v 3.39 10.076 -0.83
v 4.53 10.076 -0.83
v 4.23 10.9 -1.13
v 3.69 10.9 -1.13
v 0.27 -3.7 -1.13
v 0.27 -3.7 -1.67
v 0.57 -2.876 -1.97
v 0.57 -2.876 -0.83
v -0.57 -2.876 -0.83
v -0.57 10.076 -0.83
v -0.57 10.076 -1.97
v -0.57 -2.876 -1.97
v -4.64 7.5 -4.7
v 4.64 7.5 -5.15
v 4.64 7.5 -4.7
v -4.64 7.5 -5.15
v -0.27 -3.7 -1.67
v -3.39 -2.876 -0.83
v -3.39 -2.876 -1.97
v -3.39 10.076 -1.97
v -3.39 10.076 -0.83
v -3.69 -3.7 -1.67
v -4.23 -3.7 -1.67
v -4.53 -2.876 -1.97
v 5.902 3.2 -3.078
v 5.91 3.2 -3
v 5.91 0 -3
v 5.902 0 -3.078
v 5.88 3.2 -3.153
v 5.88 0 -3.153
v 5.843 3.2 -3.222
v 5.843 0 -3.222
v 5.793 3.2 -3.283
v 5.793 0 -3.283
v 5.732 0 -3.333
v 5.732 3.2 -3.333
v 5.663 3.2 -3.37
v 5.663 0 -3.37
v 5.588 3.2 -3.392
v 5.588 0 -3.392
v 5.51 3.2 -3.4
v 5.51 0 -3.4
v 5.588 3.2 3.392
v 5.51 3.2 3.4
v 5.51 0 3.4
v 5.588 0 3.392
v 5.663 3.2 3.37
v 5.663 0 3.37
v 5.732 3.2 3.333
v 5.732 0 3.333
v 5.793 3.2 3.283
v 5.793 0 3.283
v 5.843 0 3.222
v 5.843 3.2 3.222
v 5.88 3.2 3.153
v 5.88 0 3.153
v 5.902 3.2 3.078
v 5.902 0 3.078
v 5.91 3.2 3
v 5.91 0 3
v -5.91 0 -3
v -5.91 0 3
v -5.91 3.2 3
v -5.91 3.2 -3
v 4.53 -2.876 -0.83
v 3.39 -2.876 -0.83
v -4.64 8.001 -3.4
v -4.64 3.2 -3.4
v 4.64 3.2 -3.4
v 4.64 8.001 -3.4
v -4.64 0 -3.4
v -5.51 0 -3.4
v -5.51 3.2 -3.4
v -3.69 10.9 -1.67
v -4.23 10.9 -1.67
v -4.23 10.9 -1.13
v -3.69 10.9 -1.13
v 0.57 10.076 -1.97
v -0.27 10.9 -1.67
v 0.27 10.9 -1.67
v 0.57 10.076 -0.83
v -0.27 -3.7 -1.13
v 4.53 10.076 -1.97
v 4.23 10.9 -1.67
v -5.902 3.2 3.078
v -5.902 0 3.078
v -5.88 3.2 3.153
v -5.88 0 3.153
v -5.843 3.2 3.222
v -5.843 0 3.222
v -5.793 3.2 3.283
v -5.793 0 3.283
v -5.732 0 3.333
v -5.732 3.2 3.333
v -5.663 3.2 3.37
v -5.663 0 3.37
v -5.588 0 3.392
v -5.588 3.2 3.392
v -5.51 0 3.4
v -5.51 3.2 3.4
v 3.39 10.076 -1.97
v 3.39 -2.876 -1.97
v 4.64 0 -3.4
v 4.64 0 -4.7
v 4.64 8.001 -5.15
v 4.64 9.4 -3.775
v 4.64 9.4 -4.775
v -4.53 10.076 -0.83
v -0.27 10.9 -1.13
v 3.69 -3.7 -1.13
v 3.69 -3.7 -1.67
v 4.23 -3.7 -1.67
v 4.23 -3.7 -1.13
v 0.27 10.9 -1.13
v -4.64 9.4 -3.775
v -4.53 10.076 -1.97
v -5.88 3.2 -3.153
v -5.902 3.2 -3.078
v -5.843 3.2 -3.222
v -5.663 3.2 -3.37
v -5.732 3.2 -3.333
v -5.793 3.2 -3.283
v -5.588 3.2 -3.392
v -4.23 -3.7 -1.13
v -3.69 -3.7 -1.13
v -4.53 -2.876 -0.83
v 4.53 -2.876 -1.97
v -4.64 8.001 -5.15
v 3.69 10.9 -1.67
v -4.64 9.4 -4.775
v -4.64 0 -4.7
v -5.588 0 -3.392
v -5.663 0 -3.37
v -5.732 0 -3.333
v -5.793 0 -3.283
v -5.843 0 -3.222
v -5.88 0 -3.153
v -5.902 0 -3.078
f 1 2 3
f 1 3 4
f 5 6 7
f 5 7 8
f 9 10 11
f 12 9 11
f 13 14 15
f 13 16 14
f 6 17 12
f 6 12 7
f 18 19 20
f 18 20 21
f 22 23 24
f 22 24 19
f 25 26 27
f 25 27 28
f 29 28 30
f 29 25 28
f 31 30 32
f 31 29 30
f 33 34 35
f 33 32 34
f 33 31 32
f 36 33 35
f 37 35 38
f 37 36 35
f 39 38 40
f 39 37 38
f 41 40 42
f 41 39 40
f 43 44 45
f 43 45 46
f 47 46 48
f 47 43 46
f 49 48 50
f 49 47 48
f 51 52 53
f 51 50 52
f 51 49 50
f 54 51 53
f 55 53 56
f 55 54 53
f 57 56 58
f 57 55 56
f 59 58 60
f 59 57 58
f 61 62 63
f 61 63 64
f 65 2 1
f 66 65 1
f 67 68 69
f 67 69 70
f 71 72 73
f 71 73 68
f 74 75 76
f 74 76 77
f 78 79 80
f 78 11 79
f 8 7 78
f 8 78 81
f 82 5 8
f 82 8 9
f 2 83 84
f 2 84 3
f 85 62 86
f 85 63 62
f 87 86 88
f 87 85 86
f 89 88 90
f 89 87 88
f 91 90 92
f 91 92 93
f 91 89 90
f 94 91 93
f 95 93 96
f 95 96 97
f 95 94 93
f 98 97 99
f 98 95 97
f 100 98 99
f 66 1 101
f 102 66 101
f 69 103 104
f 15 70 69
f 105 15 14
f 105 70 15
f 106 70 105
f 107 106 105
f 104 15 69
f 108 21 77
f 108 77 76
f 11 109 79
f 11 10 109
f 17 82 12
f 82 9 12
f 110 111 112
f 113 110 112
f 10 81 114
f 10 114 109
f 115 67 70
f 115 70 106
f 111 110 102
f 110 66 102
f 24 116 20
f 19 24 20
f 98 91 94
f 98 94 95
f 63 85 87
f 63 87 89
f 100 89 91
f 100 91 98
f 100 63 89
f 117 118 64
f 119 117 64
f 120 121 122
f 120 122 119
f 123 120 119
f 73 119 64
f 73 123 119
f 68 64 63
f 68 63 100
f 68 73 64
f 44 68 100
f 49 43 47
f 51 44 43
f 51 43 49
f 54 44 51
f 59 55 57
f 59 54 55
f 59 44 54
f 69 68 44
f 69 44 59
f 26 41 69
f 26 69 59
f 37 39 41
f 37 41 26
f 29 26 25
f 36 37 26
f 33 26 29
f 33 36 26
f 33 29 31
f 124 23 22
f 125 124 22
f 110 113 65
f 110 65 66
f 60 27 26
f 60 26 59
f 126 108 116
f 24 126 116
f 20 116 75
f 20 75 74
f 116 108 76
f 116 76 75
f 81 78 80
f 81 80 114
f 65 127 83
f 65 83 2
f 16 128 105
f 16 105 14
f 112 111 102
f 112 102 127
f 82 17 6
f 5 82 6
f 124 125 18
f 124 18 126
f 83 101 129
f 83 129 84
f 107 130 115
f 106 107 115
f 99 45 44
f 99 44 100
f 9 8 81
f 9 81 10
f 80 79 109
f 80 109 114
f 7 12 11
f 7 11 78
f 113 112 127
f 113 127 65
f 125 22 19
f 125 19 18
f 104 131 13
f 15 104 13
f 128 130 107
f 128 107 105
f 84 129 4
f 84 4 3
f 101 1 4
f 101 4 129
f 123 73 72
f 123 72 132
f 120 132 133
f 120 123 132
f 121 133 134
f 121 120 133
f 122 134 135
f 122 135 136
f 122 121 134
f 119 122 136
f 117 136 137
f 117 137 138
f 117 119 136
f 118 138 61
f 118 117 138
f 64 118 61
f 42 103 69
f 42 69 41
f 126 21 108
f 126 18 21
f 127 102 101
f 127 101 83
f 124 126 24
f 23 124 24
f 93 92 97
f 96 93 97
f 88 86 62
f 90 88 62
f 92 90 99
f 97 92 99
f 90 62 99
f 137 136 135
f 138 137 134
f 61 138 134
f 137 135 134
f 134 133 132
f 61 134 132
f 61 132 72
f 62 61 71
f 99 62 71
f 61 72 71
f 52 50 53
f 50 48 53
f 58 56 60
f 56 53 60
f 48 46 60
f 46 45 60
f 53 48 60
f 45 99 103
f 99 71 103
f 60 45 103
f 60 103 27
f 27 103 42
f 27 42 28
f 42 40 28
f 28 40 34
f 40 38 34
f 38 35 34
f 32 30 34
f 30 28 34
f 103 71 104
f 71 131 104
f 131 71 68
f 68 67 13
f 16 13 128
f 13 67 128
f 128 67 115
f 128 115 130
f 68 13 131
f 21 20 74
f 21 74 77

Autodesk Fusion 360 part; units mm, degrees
sketch "Skizze1" plane through (0, 0, 0) normal (0, 1, 0) x (1, 0, 0)
  line L0 (-5.91, 3.4) -> (5.91, 3.4)
  line L1 (5.91, 3.4) -> (5.91, -3.4)
  line L2 (5.91, -3.4) -> (-5.91, -3.4)
  line L3 (-5.91, -3.4) -> (-5.91, 3.4)
  line L4 (0, 3.4) -> (0, -3.4) construction
  dimension "d9" = 11.82
  dimension "d10" = 6.8
extrude "Extrusion1" add sketch "Skizze1" along normal blind 3.2 makes body 1
sketch "Skizze3" plane through (0, 0, 0) normal (1, 0, 0) x (0, 0, -1)
  line L0 (3.4, 0) -> (3.4, 3.2)
  line L1 (3.4, 0) -> (4.7, 0)
  line L2 (4.7, 0) -> (4.7, 9.4)
  line L3 (4.7, 9.4) -> (3.4, 9.4) construction
  line L4 (3.4, 9.4) -> (3.4, 0)
  line L5 (4.7, 9.4) -> (5.15, 9.4)
  line L6 (5.15, 9.4) -> (5.15, 0)
  line L7 (5.15, 0) -> (4.7, 0)
  line L8 (4.7, 0) -> (4.7, 9.4) construction
  line L9 (3.4, 8.0005) -> (3.775, 9.4)
  line L10 (4.775, 9.4) -> (5.15, 8.0005)
  line L11 (5.15, 7.5005) -> (4.7, 7.5005)
  line L12 (4.775, 9.4) -> (3.775, 9.4)
  line L13 (3.775, 9.4) -> (4.775, 9.4) construction
  line L14 (4.775, 9.4) -> (5.15, 9.4) construction
  line L15 (3.775, 9.4) -> (3.4, 9.4) construction
  line L16 (5.15, 9.4) -> (4.775, 9.4) construction
  line L17 (5.15, 8.0005) -> (5.15, 7.5005) construction
  line L18 (5.15, 7.5005) -> (5.15, 8.0005) construction
  line L19 (5.15, 9.4) -> (3.4, 9.4)
  line L20 (5.15, 0) -> (3.4, 0)
  dimension "d31" = 9.4
  dimension "d33" = 1.3
  dimension "d35" = 90
  dimension "d36" = 75
  dimension "d37" = 75
  dimension "d39" = 1
  dimension "d42" = 0.5
  dimension "d48" = 1.75
sketch "Skizze2" plane through (0, 0, 0) normal (0, 1, 0) x (1, 0, 0)
  line L0 (-3.39, 0.83) -> (-4.53, 0.83)
  line L1 (-4.53, 0.83) -> (-4.53, 1.97)
  line L2 (-4.53, 1.97) -> (-3.39, 1.97)
  line L3 (-3.39, 1.97) -> (-3.39, 0.83)
  line L4 (-5.91, 3.4) -> (5.91, 3.4)
  line L5 (5.91, 3.4) -> (5.91, -3.4)
  line L6 (5.91, -3.4) -> (-5.91, -3.4)
  line L7 (-5.91, -3.4) -> (-5.91, 3.4)
  line L8 (0, 3.4) -> (0, 1.4) construction
  line L9 (-3.39, 1.4) -> (-4.53, 1.4) construction
  line L10 (0, 1.4) -> (-3.96, 1.4)
  point P0 (-3.96, 1.4)
  dimension "d16" = 1.14
  dimension "d17" = 1.14
  dimension "d24" = 2
  dimension "d26" = 3.96
extrude "Extrusion3" add sketch "Skizze3" along normal mid plane 9.28 contours L0 L1 L2 L4 L9 L12 L19 L20 | L2 L5 L6 L10 L11 L12 L19 bodies 1
extrude "Extrusion2" add sketch "Skizze2" along normal blind 10.9 and the other way blind 3.7 separate body contours L0 L1 L2 L3 makes body 2
chamfer "Fase2" distance 0.3 angle 70 8 edges at (-3.96, 10.9, -0.83) (-3.39, 10.9, -1.4) (-3.96, 10.9, -1.97) (-4.53, 10.9, -1.4) (-3.39, -3.7, -1.4) (-3.96, -3.7, -0.83) (-4.53, -3.7, -1.4) (-3.96, -3.7, -1.97) measured on face at (-3.77, 10.9, -1.21) measured on face at (-3.77, 10.9, -1.21) measured on face at (-3.77, 10.9, -1.21) measured on face at (-3.77, 10.9, -1.21) measured on face at (-3.77, -3.7, -1.21) measured on face at (-3.77, -3.7, -1.21) measured on face at (-3.77, -3.7, -1.21) measured on face at (-3.77, -3.7, -1.21) on bodies 2
pattern_linear "R-Anordnung1" count 3 spacing 3.96 along (1, 0, 0) of bodies 2 makes body 3 at (0.57, 1.4414, -1.59) makes body 4 at (4.53, 1.4414, -1.59)
fillet "Abrundung1" radius 0.4 4 edges at (5.91, 1.6, -3.4) (5.91, 1.6, 3.4) (-5.91, 1.6, 3.4) (-5.91, 1.6, -3.4) on bodies 1
equation "n = 3" comment "Number of pins"
equation "P = 3.96 mm" comment "Pin pitch"
equation "B1 = A1 + ( 1.95 mm * 2 )" comment "Width of bottom plate"
equation "A1 = ( n - 1 ) * P" comment "Total width of all pins"
equation "C1 = 6.8 mm" comment "Height of bottom plate"
equation "H1 = 9.4 mm" comment "Height of latching plate"
equation "O1 = 2 mm" comment "Vertical offset pin-center to bottom plate border"
equation "d9 = B1"
equation "d10 = C1"
equation "D1 = 3.2 mm" comment "Total depth of bottom plate"
equation "Pw = 1.14 mm" comment "Width & height of square pin"
equation "d13 = D1"
equation "d16 = Pw"
equation "d17 = Pw"
equation "LPinTop = 7.7 mm + D1" comment "Length of the pin measured from the bottom plane to the top of the pin (away from PCB)"
equation "LPinBottom = 14.6 mm - LPinTop" comment "Length of the pin in bottom direction, measured from the bottom plane"
equation "d20 = LPinTop"
equation "d22 = LPinBottom"
equation "d24 = O1"
equation "Pin1XOffset = ( ( n - 1 ) * P ) / 2" comment "First pin X offset measured from the X axis"
equation "d26 = Pin1XOffset"
equation "d27 = n"
equation "d29 = P"
equation "d31 = H1"
equation "D2 = 1.3 mm" comment "(Measured) depth of latching plate (narrowest section)"
equation "d33 = D2"
equation "d35 = alpha"
equation "d36 = 90 deg - beta"
equation "d37 = 90 deg - beta"
equation "Wx1 = 1.0 mm" comment "(Measured) Width of the topmost part of the latching plate"
equation "Hx1 = 0.5 mm" comment "(Measured) Height of the latching surface facing away from the pins"
equation "alpha = 90 deg" comment "Angle of the latching surface. Shown by the datasheet as ~45°but real parts have 90°"
equation "d42 = Hx1"
equation "beta = 15 deg" comment "(Estimated) Latching plate tapering angle"
equation "WL1 = 1.27 mm" comment "(Measured) With of the section of the bottom plate where there is no latching plate per side)"
equation "d45 = B1 - ( WL1 * 2 )"
equation "Dlatch = 1.75 mm" comment "(Measured) Total depth of latching plate"
equation "d48 = Dlatch"
equation "d54 = delta"
equation "delta = 70 deg" comment "(Estimated) Taper angle of the pin top & bottoms"
